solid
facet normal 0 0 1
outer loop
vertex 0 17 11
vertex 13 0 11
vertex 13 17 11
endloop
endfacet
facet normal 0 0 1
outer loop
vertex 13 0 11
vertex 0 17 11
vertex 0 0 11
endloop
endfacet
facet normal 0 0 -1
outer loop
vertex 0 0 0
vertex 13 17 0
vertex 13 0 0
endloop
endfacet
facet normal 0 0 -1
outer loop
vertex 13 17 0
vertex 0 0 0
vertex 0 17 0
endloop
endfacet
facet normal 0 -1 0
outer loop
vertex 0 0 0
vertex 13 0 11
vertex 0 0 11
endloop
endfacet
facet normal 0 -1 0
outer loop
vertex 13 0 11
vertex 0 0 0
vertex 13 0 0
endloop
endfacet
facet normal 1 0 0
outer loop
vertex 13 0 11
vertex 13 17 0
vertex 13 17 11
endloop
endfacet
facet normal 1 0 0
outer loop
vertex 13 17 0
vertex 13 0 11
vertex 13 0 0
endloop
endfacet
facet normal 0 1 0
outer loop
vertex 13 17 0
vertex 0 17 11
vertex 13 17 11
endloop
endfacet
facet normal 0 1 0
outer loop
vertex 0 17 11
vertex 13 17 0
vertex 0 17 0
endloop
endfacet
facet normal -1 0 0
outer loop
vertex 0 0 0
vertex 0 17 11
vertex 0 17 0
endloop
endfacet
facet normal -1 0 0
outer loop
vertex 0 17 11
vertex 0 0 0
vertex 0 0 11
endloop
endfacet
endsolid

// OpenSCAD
// Generated by SolidPython 1.0.1 on 2020-07-29 00:46:55


cube(size = [13, 17, 11]);
/***********************************************
*********      SolidPython code:      **********
************************************************
 
# import packages: SolidPython
from solid import *
from solid.utils import *
from itertools import chain, combinations, permutations


class Resize:

    def __init__(self, scad_file):
        self.scad_file = scad_file
        #self.scad_file = import_scad(scad_file)
        # cone/cylinder param:
        self.r1 = 0
        self.r2 = 0
        self.h = 0
        # rectangular prism param:
        self.w = 0
        self.l = 0
        # ellipse param:
        self.r = 0

    # import OpenScad code (file name corresponds to shape)


    # classify shape + parameters
    def assign(self, param1, param2, param3):
        if self.scad_file == 'cone.scad':
            self.r1 = param1
            self.r2 = param2
            self.h = param3
        elif self.scad_file == 'cylinder.scad':
            self.r1 = param1
            self.r2 = param2
            self.h = param3
        elif self.scad_file == 'rectangularPrism.scad':
            self.h = param1
            self.l = param2
            self.w = param3
        else:
            self.r = param1
            self.h = param2

    # resize parameters
    def iterate(self):
        x = range(3, 20, 2)
        i = 1
        if self.scad_file == 'cone.scad':
            tempList = list(permutations(x, 2))
            for temp in tempList:
                param1 = temp[0]
                param2 = temp[1]
                filepath = 'produced_scad_files/' + 'cone' + str(param1) + '_' + str(param2) + '_' + '.scad'
                scad_render_to_file(cylinder(h=param1, r1=param2, r2=0), filepath)

        elif self.scad_file == 'cylinder.scad':
            tempList = list(permutations(x, 3))
            for temp in tempList:
                param1 = temp[0]
                param2 = temp[1]
                filepath = 'produced_scad_files/' + 'cylinder' + str(param1) + '_' + str(param2) + '_' + '.scad'
                scad_render_to_file(cylinder(h=param1, r1=param2, r2=param2), filepath)

        elif self.scad_file == 'rectangularPrism.scad':
            tempList = list(permutations(x, 3))
            for temp in tempList:
                param1 = temp[0]
                param2 = temp[1]
                param3 = temp[2]
                filepath = 'produced_scad_files/' + 'rectangularPrism' + str(param1) + '_' + str(param2) + '_' + str(
                    param3) + '.scad'
                scad_render_to_file(cube(size=(param1, param2, param3)), filepath)

        elif self.scad_file == 'ellipse.scad':
            tempList = list(permutations(x, 4))
            for temp in tempList:
                param1 = temp[0]
                param2 = temp[1]
                param3 = temp[2]
                param4 = temp[3]
                filepath = 'produced_scad_files/' + 'ellipse' + str(param1) + '_' + str(param2) + '_' + str(param3) + '_' + str(param4) + '.scad'
                scad_render_to_file(scale([param1, param2, param3])(sphere(r=param4)), filepath)

    def render_to_scadfile(self):
        scad_render_to_file(scad, 'example.scad') 
 
************************************************/
